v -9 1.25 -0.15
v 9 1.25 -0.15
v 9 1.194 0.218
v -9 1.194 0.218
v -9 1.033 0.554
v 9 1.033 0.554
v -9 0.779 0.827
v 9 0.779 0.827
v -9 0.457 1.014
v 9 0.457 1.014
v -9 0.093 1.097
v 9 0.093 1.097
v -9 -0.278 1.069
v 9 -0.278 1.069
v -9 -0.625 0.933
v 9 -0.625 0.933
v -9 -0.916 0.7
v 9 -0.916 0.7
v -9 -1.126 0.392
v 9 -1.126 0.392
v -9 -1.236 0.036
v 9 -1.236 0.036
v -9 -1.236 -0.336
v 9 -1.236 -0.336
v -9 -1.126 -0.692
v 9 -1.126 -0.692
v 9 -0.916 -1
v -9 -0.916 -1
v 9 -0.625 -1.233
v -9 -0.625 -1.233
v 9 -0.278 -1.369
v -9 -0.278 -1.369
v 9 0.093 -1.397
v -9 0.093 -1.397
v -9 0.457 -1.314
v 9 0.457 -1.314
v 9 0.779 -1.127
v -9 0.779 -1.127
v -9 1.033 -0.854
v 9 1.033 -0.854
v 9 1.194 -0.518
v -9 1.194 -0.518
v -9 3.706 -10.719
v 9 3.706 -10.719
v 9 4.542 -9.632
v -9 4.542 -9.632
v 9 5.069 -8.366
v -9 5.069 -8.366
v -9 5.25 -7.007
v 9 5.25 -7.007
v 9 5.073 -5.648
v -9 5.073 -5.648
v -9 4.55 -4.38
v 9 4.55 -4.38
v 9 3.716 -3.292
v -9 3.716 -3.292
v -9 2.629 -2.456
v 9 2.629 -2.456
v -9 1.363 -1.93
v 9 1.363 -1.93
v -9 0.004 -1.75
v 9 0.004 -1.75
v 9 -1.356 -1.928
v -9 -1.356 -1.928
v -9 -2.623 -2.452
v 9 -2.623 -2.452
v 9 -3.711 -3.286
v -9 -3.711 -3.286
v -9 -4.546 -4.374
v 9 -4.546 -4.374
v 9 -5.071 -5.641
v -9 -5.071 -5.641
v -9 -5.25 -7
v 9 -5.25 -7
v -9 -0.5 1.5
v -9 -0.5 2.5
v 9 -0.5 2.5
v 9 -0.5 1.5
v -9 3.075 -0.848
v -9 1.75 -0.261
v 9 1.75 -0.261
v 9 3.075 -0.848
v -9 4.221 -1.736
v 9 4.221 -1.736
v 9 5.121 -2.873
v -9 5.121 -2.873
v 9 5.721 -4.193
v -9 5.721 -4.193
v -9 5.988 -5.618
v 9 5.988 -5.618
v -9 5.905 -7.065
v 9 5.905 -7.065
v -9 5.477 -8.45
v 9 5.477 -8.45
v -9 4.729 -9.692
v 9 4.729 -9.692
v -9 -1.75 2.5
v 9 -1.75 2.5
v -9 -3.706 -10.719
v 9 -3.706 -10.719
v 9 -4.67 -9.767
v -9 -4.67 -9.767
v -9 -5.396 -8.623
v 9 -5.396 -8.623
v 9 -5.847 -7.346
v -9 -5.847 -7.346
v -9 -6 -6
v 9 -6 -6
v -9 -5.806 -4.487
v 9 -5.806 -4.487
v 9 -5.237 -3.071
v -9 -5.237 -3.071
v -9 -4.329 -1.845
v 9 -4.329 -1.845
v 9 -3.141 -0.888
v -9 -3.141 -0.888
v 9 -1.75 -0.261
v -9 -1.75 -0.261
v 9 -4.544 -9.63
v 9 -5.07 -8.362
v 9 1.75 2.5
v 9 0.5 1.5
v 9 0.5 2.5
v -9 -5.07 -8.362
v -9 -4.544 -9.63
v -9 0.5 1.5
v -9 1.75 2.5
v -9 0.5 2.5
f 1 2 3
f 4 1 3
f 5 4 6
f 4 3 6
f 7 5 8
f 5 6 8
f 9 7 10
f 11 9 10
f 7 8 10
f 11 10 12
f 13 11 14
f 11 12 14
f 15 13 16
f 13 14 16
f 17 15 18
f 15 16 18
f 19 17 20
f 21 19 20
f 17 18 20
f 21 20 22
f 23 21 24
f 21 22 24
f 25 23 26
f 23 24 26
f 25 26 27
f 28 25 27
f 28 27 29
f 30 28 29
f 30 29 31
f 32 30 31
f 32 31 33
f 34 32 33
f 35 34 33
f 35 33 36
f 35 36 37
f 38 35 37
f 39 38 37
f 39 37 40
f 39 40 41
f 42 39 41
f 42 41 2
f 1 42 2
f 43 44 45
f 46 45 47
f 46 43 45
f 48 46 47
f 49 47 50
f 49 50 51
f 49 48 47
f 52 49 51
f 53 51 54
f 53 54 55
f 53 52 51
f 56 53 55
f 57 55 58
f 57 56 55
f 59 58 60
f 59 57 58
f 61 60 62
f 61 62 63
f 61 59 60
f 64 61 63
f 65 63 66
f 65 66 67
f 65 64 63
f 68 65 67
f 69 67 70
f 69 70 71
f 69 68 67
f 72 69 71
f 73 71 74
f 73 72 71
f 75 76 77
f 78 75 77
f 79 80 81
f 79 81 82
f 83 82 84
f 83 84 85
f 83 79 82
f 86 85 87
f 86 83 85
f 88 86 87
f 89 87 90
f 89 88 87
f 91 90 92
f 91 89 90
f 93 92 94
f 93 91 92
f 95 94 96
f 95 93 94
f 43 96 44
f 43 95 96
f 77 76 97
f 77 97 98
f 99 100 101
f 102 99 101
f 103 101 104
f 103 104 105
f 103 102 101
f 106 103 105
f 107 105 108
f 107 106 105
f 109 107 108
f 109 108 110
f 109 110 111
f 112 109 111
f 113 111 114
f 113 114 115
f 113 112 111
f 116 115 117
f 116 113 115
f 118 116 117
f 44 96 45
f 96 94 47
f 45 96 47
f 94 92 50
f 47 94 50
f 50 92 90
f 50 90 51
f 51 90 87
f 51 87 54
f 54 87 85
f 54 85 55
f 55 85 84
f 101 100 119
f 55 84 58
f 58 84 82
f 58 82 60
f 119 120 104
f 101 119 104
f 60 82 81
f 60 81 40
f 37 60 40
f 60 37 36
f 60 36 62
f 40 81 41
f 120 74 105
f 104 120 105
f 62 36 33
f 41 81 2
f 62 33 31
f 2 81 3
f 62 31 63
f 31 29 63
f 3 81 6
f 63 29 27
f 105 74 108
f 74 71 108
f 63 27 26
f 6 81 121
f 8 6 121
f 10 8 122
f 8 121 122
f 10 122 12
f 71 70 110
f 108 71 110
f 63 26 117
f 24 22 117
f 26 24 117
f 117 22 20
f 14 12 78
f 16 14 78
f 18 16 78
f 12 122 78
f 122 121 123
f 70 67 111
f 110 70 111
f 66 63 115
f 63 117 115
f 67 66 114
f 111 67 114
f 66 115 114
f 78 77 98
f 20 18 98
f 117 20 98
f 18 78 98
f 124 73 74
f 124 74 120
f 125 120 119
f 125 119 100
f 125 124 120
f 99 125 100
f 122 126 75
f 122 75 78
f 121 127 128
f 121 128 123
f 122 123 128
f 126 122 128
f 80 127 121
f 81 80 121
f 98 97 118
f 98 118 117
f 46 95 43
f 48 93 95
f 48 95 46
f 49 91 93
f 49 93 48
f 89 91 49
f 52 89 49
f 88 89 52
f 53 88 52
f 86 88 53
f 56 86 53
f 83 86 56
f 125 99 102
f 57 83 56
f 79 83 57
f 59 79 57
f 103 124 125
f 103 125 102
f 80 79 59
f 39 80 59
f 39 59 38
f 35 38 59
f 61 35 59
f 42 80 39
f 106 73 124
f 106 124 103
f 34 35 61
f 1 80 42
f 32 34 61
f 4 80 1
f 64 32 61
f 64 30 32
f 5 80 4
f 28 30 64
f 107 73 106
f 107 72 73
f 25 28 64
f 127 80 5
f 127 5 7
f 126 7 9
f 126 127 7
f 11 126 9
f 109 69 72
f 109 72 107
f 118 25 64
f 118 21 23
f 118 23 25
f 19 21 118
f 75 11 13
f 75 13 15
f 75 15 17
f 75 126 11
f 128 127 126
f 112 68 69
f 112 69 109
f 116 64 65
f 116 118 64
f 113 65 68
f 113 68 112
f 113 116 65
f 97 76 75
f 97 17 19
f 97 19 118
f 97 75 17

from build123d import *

# Parameters (mm, degrees)
F0_W     = 18
F0_H     = 3.5
F1_DEPTH = 2.5
F3_DEPTH = 1
F4_W     = 18
F4_H     = 3.5
F5_DEPTH = 0.5
F7_DEPTH = 18
F8_R     = 1.25
F9_DEPTH = 18.001


with BuildPart() as f1:
    # F0 (on Top) → F1 (new body)
    with BuildSketch(Plane.XY):
        Rectangle(F0_W, F0_H)
    extrude(amount=F1_DEPTH)

    # F2 (on face) → F3 (cut)
    with BuildSketch(Plane.XY.offset(2.5)):
        with BuildLine():
            ThreePointArc((-8.5, 0), (-8.6464466094, 0.3535533906), (-9, 0.5))
            Line((-9, 0.5), (-9, -0.5))
            ThreePointArc((-9, -0.5), (-8.6464466094, -0.3535533906), (-8.5, 0))
        make_face()
        with BuildLine():
            Line((9, 0.5), (-9, 0.5))
            ThreePointArc((-9, 0.5), (-8.6464466094, 0.3535533906), (-8.5, 0))
            ThreePointArc((-8.5, 0), (-8.6464466094, -0.3535533906), (-9, -0.5))
            Line((-9, -0.5), (9, -0.5))
            ThreePointArc((9, -0.5), (8.5, 0), (9, 0.5))
        make_face()
        with BuildLine():
            Line((-9, -0.5), (-9, 0.5))
            ThreePointArc((-9, 0.5), (-9.5, 0), (-9, -0.5))
        make_face()
        with BuildLine():
            ThreePointArc((9.5, 0), (9.3535533906, 0.3535533906), (9, 0.5))
            Line((9, 0.5), (9, -0.5))
            ThreePointArc((9, -0.5), (9.3535533906, -0.3535533906), (9.5, 0))
        make_face()
        with BuildLine():
            Line((9, -0.5), (9, 0.5))
            ThreePointArc((9, 0.5), (8.5, 0), (9, -0.5))
        make_face()
    extrude(amount=-F3_DEPTH, mode=Mode.SUBTRACT)

    # F4 (on face) → F5 (join)
    with BuildSketch(Plane(origin=(0, 0, 0), x_dir=(1, 0, 0), z_dir=(0, 0, -1))):
        Rectangle(F4_W, F4_H)
    extrude(amount=F5_DEPTH)

    # F6 (on face) → F7 (join)
    with BuildSketch(Plane(origin=(-9, 0, 0), x_dir=(0, -1, 0), z_dir=(-1, 0, 0))):
        with BuildLine():
            ThreePointArc((3.7058600132, -10.71875), (5.3960707964, -8.6234366698), (6, -6))
            ThreePointArc((6, -6), (4.8218253805, -2.4292857857), (1.75, -0.2608798584))
            Line((1.75, -0.2608798584), (1.75, -0.5))
            Line((1.75, -0.5), (-1.75, -0.5))
            Line((-1.75, -0.5), (-1.75, -0.2608798584))
            ThreePointArc((-1.75, -0.2608798584), (-5.897742288, -4.8969878041), (-3.7058600132, -10.71875))
            ThreePointArc((-3.7058600132, -10.71875), (-2.0132976594, -2.1513782851), (5.25, -7))
            ThreePointArc((5.25, -7), (4.8486217149, -9.0132976594), (3.7058600132, -10.71875))
        make_face()
        with BuildLine():
            Line((1.75, -0.5), (1.75, -0.2608798584))
            ThreePointArc((1.75, -0.2608798584), (0, 0), (-1.75, -0.2608798584))
            Line((-1.75, -0.2608798584), (-1.75, -0.5))
            Line((-1.75, -0.5), (1.75, -0.5))
        make_face()
    extrude(amount=-F7_DEPTH)

    # F8 (on face) → F9 (cut, through all)
    with BuildSketch(Plane.YZ.offset(9)):
        with Locations((0, -0.15)):
            Circle(F8_R)
    extrude(amount=-F9_DEPTH, mode=Mode.SUBTRACT)


solid = f1.part
